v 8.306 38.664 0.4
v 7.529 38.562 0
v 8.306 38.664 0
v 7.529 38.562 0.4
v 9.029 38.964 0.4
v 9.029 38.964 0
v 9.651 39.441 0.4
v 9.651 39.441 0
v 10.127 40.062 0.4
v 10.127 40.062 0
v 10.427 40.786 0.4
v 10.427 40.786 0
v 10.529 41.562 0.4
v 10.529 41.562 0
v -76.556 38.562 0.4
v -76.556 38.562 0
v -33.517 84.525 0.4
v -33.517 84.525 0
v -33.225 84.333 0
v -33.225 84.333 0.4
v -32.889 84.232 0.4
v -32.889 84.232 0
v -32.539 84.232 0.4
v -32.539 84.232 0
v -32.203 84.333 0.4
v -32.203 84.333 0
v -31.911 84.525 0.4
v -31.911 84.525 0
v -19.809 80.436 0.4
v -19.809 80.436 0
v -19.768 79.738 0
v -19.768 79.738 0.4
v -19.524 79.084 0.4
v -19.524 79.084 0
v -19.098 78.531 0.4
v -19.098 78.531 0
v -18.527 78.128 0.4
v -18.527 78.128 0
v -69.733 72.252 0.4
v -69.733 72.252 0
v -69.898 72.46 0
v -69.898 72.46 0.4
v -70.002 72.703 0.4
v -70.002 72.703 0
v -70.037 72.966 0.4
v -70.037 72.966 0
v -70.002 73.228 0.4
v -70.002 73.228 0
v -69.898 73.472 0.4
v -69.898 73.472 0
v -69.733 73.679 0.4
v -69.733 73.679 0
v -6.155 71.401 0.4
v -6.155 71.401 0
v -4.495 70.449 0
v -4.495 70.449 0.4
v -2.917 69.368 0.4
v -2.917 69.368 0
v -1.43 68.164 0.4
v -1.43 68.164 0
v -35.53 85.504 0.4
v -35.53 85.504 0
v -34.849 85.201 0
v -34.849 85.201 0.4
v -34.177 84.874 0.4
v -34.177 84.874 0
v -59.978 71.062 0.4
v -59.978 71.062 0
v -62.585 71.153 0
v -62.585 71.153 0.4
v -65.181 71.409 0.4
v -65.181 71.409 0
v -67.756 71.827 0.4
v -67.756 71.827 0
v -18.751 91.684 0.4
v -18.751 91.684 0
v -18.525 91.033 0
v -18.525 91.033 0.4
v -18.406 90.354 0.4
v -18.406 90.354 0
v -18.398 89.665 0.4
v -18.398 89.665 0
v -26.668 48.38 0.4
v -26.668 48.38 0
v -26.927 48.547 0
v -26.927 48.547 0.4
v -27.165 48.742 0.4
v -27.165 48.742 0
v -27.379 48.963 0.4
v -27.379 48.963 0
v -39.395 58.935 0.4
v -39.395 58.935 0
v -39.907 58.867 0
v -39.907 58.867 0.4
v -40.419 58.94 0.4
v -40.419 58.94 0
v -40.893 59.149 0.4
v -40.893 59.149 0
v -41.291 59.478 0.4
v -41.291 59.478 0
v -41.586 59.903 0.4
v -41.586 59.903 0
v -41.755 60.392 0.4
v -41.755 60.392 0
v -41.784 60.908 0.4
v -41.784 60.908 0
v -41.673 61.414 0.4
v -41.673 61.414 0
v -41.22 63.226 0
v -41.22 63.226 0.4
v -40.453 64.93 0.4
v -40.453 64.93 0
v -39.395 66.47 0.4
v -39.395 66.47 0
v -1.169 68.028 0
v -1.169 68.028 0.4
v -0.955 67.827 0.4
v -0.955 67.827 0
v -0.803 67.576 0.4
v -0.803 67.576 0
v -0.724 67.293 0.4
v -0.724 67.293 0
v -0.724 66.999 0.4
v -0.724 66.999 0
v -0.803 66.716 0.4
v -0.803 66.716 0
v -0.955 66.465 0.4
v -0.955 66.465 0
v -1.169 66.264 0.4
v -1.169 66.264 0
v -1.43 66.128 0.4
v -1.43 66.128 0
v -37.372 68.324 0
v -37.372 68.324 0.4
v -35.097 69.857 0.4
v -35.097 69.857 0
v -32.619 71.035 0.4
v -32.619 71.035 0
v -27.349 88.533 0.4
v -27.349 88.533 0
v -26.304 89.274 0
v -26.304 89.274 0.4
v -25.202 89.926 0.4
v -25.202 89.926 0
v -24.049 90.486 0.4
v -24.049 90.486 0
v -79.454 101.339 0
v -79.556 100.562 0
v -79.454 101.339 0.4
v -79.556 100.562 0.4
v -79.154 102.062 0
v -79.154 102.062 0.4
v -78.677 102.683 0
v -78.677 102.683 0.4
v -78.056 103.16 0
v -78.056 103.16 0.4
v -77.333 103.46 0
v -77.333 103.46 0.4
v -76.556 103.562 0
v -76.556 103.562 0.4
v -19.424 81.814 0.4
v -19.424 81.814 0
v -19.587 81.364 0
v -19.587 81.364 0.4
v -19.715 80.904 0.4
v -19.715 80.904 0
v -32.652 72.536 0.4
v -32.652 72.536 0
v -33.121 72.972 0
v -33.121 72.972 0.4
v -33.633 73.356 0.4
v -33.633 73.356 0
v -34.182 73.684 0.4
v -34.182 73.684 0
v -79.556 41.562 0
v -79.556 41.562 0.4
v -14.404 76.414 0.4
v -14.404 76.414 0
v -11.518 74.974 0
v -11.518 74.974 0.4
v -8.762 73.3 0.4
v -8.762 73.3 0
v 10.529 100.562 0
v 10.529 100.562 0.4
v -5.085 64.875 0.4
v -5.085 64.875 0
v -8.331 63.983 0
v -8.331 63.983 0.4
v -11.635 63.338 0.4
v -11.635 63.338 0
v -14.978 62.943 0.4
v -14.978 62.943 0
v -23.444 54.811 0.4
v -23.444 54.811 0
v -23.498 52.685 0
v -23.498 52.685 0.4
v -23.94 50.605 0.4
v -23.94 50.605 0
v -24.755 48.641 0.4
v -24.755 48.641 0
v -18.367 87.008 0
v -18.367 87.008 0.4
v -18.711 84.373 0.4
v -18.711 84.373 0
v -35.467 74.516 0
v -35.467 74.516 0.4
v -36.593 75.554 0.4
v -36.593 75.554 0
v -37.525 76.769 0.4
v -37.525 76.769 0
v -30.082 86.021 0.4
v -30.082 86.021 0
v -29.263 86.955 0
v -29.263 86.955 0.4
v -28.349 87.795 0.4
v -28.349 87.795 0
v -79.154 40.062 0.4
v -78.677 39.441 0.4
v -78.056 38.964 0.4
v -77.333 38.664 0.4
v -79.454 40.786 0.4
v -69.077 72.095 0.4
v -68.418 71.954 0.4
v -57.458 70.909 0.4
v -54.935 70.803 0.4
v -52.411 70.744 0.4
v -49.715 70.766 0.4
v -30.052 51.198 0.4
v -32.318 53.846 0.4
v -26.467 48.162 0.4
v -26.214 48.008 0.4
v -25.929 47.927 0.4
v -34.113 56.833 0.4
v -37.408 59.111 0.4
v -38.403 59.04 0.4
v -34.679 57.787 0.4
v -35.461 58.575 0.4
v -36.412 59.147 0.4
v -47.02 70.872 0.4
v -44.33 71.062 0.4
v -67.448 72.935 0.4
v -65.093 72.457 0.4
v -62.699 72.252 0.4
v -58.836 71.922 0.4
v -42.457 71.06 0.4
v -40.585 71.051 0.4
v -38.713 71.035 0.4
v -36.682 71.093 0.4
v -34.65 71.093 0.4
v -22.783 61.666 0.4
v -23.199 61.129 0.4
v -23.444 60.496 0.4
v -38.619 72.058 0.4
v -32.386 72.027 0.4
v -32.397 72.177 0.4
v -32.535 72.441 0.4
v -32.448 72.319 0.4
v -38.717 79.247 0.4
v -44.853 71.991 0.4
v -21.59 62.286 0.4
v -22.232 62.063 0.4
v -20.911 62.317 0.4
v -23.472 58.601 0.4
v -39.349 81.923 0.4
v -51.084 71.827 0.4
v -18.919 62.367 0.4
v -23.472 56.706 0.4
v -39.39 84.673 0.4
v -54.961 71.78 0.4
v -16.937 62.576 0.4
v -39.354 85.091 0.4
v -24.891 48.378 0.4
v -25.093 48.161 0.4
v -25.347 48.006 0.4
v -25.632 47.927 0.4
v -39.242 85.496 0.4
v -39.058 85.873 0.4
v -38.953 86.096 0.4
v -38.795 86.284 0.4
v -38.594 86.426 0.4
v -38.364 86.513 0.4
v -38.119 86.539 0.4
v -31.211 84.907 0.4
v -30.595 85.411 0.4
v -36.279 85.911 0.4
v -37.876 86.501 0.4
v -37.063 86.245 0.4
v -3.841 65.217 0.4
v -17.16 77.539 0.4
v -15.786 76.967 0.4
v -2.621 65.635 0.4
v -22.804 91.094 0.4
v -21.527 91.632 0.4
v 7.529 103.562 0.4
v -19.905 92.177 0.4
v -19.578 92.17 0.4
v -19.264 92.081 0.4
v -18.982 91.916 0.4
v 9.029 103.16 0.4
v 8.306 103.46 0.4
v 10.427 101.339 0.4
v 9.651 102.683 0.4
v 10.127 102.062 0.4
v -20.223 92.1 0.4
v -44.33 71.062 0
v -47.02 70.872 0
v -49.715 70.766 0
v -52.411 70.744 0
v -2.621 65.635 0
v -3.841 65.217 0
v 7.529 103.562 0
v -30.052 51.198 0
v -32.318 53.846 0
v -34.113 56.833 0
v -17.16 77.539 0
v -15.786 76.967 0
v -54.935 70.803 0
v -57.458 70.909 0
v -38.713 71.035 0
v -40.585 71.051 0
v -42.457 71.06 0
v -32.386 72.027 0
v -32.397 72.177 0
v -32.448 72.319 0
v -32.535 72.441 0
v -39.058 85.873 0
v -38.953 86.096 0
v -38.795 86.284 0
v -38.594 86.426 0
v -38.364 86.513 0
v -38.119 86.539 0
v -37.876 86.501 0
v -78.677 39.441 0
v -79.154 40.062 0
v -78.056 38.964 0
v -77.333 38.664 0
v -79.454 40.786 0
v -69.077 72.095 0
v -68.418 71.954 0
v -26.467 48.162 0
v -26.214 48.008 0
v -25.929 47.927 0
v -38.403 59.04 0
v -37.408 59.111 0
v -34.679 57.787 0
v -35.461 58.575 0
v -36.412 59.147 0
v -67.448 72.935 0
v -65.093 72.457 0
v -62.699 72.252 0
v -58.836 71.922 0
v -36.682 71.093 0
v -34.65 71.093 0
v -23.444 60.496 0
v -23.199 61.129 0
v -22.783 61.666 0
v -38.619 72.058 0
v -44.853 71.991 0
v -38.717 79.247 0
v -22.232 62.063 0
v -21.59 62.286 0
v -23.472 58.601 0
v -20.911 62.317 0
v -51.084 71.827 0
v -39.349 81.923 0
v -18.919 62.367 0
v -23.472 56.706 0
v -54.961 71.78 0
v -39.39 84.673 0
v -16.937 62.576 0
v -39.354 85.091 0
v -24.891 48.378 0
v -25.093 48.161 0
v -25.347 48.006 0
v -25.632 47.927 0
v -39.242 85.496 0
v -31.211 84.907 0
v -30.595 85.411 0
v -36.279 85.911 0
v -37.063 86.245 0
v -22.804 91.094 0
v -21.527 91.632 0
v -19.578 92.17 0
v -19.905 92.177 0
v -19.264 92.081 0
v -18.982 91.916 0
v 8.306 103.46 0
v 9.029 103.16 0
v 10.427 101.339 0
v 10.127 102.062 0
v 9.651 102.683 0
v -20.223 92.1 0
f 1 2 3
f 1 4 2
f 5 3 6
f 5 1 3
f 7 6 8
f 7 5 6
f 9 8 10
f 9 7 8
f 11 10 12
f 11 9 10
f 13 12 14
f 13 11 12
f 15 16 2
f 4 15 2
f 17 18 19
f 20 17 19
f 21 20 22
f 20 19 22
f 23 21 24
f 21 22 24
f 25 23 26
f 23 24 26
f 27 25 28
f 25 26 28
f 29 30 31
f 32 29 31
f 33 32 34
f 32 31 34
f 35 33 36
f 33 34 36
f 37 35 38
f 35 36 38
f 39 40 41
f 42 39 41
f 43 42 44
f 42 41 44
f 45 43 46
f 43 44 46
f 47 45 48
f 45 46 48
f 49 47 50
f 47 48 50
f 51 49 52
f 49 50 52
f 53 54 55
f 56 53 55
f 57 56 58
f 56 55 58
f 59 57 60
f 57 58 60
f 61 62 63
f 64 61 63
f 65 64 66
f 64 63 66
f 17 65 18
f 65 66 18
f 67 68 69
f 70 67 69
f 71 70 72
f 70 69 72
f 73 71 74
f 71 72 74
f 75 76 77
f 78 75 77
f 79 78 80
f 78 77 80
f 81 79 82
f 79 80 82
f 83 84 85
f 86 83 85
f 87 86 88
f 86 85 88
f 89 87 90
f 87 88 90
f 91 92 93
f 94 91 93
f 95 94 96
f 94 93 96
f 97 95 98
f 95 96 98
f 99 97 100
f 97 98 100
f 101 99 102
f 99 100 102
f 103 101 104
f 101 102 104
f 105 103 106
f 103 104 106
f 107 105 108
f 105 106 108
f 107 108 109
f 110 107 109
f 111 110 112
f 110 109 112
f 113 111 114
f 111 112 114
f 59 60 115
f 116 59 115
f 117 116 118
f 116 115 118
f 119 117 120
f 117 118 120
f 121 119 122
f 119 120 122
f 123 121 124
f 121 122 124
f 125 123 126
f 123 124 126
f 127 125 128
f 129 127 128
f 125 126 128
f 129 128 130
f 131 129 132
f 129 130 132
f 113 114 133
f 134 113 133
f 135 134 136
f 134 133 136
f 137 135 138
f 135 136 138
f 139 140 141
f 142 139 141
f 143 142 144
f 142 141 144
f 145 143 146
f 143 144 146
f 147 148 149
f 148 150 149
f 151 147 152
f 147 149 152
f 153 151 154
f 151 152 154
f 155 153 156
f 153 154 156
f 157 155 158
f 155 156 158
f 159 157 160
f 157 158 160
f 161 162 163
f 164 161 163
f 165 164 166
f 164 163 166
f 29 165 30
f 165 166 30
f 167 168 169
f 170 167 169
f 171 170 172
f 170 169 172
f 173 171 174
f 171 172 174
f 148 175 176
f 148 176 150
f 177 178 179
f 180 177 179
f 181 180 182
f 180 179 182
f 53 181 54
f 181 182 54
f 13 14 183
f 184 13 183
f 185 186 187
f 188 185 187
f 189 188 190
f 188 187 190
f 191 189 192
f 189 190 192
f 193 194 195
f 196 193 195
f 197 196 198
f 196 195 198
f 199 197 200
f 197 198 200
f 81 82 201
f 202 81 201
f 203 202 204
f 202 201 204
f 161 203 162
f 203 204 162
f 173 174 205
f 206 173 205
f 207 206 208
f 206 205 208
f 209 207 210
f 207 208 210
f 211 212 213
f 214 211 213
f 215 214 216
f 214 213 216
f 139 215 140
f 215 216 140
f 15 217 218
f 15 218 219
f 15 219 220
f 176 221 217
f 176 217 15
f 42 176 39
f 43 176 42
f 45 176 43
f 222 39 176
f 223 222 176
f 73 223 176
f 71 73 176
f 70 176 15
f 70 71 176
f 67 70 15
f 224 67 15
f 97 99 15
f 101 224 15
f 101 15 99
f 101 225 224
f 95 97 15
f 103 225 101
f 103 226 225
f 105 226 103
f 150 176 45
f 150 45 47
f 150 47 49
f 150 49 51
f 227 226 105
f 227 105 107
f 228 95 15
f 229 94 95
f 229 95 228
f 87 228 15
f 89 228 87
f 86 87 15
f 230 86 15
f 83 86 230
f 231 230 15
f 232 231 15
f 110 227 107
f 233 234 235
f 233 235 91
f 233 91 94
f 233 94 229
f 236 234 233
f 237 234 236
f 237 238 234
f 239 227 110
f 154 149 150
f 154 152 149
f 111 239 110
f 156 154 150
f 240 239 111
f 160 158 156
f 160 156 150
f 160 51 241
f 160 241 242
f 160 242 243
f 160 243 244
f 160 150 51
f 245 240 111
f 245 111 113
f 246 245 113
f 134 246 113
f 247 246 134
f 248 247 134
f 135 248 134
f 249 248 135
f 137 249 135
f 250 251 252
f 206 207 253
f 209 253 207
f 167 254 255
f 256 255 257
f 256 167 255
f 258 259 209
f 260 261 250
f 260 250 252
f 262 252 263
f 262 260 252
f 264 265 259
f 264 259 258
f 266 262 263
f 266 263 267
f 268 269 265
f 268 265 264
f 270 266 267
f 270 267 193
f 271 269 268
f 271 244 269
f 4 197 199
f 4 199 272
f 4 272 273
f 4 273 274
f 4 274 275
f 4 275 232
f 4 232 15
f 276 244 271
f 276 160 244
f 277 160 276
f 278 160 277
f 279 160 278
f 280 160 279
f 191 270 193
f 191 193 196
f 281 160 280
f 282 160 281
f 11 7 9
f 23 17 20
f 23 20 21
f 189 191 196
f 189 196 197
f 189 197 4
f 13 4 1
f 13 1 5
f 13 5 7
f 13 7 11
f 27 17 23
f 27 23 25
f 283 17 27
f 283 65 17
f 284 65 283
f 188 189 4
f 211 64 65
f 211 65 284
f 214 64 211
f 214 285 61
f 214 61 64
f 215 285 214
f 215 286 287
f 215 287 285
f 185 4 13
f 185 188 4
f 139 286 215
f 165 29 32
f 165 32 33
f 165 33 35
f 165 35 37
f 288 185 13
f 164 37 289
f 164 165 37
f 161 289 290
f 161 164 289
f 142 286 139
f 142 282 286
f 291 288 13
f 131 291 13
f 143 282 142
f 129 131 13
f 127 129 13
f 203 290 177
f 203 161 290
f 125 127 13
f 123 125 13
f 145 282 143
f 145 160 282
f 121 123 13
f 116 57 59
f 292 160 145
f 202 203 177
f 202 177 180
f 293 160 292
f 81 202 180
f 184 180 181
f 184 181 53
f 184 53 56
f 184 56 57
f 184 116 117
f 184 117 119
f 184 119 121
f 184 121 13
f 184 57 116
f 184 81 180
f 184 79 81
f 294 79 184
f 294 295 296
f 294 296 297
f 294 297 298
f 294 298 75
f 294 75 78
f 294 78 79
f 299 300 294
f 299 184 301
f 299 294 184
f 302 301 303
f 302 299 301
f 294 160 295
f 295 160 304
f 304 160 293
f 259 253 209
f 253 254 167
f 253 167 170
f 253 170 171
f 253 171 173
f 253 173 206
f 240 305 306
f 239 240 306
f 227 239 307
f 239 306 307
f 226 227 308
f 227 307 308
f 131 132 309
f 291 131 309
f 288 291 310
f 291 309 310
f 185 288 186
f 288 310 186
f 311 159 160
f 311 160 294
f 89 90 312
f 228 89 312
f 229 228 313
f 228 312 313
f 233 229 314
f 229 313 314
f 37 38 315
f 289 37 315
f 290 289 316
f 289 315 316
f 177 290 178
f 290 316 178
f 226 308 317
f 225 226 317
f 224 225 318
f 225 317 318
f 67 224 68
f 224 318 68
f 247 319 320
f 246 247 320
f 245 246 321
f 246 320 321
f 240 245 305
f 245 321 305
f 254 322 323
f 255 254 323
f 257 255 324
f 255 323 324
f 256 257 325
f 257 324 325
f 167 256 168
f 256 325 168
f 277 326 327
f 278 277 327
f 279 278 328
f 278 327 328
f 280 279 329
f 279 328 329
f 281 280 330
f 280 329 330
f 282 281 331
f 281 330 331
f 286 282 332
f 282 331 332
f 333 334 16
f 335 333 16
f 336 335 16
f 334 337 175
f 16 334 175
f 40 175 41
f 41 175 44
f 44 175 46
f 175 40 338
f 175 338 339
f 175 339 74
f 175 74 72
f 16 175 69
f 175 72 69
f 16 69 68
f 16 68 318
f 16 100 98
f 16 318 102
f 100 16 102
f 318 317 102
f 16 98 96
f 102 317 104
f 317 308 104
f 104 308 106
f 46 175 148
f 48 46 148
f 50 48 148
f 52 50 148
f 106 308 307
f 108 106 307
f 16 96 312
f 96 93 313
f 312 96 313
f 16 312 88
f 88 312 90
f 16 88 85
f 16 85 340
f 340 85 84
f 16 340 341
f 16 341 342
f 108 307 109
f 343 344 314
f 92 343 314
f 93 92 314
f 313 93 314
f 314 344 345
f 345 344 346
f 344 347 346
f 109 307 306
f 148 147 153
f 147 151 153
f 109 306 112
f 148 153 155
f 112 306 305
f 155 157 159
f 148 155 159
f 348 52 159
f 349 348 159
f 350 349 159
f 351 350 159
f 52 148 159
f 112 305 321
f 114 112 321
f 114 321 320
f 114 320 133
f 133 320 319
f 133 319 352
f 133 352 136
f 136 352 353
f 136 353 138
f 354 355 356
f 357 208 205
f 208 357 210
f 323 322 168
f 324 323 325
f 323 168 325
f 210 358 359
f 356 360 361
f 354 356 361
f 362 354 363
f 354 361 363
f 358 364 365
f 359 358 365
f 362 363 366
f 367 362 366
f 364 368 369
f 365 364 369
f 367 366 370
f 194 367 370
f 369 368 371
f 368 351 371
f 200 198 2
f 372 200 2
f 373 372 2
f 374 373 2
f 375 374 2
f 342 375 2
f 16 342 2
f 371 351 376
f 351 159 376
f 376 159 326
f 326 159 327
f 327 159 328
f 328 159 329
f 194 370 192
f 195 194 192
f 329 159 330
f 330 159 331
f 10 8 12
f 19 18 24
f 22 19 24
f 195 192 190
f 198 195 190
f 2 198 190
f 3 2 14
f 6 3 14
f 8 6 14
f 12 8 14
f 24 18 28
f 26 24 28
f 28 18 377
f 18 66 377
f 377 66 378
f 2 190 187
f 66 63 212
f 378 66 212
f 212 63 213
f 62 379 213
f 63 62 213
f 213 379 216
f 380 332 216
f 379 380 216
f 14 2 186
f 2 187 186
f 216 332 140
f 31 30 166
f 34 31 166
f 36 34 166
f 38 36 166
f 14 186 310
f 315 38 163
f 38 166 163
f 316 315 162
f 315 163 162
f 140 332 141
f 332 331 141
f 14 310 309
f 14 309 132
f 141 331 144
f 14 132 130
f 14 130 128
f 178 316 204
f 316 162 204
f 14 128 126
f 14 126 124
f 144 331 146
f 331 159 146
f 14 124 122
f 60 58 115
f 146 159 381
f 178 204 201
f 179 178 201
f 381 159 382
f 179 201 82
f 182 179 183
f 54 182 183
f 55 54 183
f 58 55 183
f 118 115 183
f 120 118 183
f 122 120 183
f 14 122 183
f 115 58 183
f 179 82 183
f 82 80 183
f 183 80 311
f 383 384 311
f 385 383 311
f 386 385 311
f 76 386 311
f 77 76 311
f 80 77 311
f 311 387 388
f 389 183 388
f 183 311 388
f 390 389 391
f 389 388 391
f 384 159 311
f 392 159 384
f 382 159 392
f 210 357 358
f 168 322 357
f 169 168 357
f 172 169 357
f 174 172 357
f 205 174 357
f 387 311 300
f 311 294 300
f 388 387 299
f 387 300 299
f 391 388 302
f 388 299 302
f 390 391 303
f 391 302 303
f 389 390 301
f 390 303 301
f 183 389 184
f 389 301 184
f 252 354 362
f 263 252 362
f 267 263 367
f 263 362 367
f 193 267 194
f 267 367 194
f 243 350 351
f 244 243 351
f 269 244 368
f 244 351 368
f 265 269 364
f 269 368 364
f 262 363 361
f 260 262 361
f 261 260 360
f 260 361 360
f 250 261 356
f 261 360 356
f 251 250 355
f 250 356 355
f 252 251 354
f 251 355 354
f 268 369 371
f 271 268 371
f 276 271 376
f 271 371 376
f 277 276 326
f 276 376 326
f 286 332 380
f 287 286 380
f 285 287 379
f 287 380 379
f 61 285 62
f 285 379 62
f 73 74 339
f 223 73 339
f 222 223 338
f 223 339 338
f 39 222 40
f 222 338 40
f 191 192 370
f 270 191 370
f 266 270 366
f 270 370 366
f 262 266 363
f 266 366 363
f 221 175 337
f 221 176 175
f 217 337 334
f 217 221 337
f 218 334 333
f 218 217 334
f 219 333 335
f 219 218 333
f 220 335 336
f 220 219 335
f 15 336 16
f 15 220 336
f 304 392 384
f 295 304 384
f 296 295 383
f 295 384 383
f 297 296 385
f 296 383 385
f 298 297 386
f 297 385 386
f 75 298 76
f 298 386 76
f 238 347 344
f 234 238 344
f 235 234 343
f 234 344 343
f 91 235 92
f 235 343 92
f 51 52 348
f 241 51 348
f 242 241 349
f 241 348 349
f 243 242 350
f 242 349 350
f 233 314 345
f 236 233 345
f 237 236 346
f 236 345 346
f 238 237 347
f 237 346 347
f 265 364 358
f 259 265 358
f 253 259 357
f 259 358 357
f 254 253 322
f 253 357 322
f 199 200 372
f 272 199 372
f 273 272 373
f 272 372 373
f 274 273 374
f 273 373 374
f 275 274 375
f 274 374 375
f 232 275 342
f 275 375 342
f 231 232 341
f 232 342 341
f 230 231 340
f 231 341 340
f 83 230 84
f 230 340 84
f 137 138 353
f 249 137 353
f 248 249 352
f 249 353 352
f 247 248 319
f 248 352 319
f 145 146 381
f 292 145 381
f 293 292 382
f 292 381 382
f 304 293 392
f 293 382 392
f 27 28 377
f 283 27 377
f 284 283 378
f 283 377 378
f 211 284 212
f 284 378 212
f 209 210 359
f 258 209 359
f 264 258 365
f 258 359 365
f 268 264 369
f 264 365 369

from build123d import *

# Parameters (mm, degrees)
F0_W     = 90.085417
F0_H     = 65
F1_DEPTH = 0.4
F2_R     = 3


with BuildPart() as f1:
    # F0 (on Top) → F1 (new body)
    with BuildSketch(Plane.XY):
        with Locations((-34.513384, 71.062082)):
            Rectangle(F0_W, F0_H)
        with BuildLine():
            ThreePointArc((-69.733061, 72.252296), (-70.037452, 72.9657), (-69.733061, 73.679104))
            ThreePointArc((-69.733061, 73.679104), (-66.277666, 72.662249), (-62.699161, 72.252296))
            ThreePointArc((-62.699161, 72.252296), (-56.899597, 71.827041), (-51.084463, 71.826756))
            ThreePointArc((-51.084463, 71.826756), (-41.736311, 72.036863), (-32.385804, 72.027013))
            ThreePointArc((-32.385804, 72.027013), (-32.447617, 72.318587), (-32.651793, 72.535723))
            ThreePointArc((-32.651793, 72.535723), (-33.37165, 73.170547), (-34.182325, 73.684357))
            ThreePointArc((-34.182325, 73.684357), (-36.052225, 75.011267), (-37.525058, 76.768532))
            ThreePointArc((-37.525058, 76.768532), (-39.105383, 80.56787), (-39.390337, 84.672891))
            ThreePointArc((-39.390337, 84.672891), (-39.30775, 85.296264), (-39.05791, 85.873321))
            ThreePointArc((-39.05791, 85.873321), (-38.593882, 86.426245), (-37.87595, 86.501233))
            ThreePointArc((-37.87595, 86.501233), (-36.667039, 86.0877), (-35.5305, 85.503958))
            ThreePointArc((-35.5305, 85.503958), (-34.511515, 85.040205), (-33.517476, 84.525146))
            ThreePointArc((-33.517476, 84.525146), (-32.714112, 84.219204), (-31.910747, 84.525146))
            ThreePointArc((-31.910747, 84.525146), (-30.891398, 85.144555), (-30.082405, 86.021066))
            ThreePointArc((-30.082405, 86.021066), (-28.817194, 87.387275), (-27.349122, 88.532723))
            ThreePointArc((-27.349122, 88.532723), (-25.759662, 89.611592), (-24.049083, 90.485811))
            ThreePointArc((-24.049083, 90.485811), (-22.169199, 91.371722), (-20.222886, 92.100188))
            ThreePointArc((-20.222886, 92.100188), (-19.418078, 92.135667), (-18.750982, 91.684051))
            ThreePointArc((-18.750982, 91.684051), (-18.451897, 90.696025), (-18.398469, 89.665107))
            ThreePointArc((-18.398469, 89.665107), (-18.492328, 85.684673), (-19.423964, 81.813663))
            ThreePointArc((-19.423964, 81.813663), (-19.655131, 81.135512), (-19.808523, 80.435656))
            ThreePointArc((-19.808523, 80.435656), (-19.524158, 79.083881), (-18.526657, 78.128293))
            ThreePointArc((-18.526657, 78.128293), (-16.473627, 77.251073), (-14.404099, 76.41352))
            ThreePointArc((-14.404099, 76.41352), (-10.122537, 74.16568), (-6.154825, 71.401298))
            ThreePointArc((-6.154825, 71.401298), (-3.695329, 69.924312), (-1.429767, 68.164244))
            ThreePointArc((-1.429767, 68.164244), (-0.713523, 67.146137), (-1.429767, 66.12803))
            ThreePointArc((-1.429767, 66.12803), (-3.227955, 65.416387), (-5.084508, 64.874977))
            ThreePointArc((-5.084508, 64.874977), (-9.976943, 63.629856), (-14.978415, 62.943183))
            ThreePointArc((-14.978415, 62.943183), (-17.926019, 62.451714), (-20.911293, 62.317375))
            ThreePointArc((-20.911293, 62.317375), (-22.521594, 61.884738), (-23.443695, 60.495503))
            ThreePointArc((-23.443695, 60.495503), (-23.475992, 57.653382), (-23.443695, 54.811262))
            ThreePointArc((-23.443695, 54.811262), (-23.670886, 51.635211), (-24.755443, 48.641443))
            ThreePointArc((-24.755443, 48.641443), (-25.632093, 47.926504), (-26.668407, 48.380055))
            ThreePointArc((-26.668407, 48.380055), (-27.048379, 48.641443), (-27.378937, 48.963055))
            ThreePointArc((-27.378937, 48.963055), (-31.240313, 52.474908), (-34.11299, 56.832783))
            ThreePointArc((-34.11299, 56.832783), (-35.046077, 58.204971), (-36.411949, 59.14728))
            ThreePointArc((-36.411949, 59.14728), (-37.906014, 59.079419), (-39.394673, 58.935445))
            ThreePointArc((-39.394673, 58.935445), (-41.29149, 59.47788), (-41.672554, 61.413582))
            ThreePointArc((-41.672554, 61.413582), (-40.874342, 64.095279), (-39.394673, 66.469982))
            ThreePointArc((-39.394673, 66.469982), (-36.262975, 69.133012), (-32.618675, 71.035206))
            ThreePointArc((-32.618675, 71.035206), (-35.665717, 71.099965), (-38.712759, 71.035206))
            ThreePointArc((-38.712759, 71.035206), (-41.521297, 71.056807), (-44.329915, 71.061701))
            ThreePointArc((-44.329915, 71.061701), (-48.366856, 70.808622), (-52.411202, 70.743747))
            ThreePointArc((-52.411202, 70.743747), (-56.196688, 70.850198), (-59.977759, 71.061701))
            ThreePointArc((-59.977759, 71.061701), (-63.884718, 71.260632), (-67.755558, 71.826756))
            ThreePointArc((-67.755558, 71.826756), (-68.747937, 72.022667), (-69.733061, 72.252296))
        make_face(mode=Mode.SUBTRACT)
    extrude(amount=F1_DEPTH)

    # F2
    f2_edges = [f1.edges().sort_by_distance(p)[0] for p in [
        (-79.556093, 38.562082, 0.2),
        (-79.556093, 103.562082, 0.2),
        (10.529324, 38.562082, 0.2),
        (10.529324, 103.562082, 0.2),
    ]]
    fillet(f2_edges, radius=F2_R)


solid = f1.part
